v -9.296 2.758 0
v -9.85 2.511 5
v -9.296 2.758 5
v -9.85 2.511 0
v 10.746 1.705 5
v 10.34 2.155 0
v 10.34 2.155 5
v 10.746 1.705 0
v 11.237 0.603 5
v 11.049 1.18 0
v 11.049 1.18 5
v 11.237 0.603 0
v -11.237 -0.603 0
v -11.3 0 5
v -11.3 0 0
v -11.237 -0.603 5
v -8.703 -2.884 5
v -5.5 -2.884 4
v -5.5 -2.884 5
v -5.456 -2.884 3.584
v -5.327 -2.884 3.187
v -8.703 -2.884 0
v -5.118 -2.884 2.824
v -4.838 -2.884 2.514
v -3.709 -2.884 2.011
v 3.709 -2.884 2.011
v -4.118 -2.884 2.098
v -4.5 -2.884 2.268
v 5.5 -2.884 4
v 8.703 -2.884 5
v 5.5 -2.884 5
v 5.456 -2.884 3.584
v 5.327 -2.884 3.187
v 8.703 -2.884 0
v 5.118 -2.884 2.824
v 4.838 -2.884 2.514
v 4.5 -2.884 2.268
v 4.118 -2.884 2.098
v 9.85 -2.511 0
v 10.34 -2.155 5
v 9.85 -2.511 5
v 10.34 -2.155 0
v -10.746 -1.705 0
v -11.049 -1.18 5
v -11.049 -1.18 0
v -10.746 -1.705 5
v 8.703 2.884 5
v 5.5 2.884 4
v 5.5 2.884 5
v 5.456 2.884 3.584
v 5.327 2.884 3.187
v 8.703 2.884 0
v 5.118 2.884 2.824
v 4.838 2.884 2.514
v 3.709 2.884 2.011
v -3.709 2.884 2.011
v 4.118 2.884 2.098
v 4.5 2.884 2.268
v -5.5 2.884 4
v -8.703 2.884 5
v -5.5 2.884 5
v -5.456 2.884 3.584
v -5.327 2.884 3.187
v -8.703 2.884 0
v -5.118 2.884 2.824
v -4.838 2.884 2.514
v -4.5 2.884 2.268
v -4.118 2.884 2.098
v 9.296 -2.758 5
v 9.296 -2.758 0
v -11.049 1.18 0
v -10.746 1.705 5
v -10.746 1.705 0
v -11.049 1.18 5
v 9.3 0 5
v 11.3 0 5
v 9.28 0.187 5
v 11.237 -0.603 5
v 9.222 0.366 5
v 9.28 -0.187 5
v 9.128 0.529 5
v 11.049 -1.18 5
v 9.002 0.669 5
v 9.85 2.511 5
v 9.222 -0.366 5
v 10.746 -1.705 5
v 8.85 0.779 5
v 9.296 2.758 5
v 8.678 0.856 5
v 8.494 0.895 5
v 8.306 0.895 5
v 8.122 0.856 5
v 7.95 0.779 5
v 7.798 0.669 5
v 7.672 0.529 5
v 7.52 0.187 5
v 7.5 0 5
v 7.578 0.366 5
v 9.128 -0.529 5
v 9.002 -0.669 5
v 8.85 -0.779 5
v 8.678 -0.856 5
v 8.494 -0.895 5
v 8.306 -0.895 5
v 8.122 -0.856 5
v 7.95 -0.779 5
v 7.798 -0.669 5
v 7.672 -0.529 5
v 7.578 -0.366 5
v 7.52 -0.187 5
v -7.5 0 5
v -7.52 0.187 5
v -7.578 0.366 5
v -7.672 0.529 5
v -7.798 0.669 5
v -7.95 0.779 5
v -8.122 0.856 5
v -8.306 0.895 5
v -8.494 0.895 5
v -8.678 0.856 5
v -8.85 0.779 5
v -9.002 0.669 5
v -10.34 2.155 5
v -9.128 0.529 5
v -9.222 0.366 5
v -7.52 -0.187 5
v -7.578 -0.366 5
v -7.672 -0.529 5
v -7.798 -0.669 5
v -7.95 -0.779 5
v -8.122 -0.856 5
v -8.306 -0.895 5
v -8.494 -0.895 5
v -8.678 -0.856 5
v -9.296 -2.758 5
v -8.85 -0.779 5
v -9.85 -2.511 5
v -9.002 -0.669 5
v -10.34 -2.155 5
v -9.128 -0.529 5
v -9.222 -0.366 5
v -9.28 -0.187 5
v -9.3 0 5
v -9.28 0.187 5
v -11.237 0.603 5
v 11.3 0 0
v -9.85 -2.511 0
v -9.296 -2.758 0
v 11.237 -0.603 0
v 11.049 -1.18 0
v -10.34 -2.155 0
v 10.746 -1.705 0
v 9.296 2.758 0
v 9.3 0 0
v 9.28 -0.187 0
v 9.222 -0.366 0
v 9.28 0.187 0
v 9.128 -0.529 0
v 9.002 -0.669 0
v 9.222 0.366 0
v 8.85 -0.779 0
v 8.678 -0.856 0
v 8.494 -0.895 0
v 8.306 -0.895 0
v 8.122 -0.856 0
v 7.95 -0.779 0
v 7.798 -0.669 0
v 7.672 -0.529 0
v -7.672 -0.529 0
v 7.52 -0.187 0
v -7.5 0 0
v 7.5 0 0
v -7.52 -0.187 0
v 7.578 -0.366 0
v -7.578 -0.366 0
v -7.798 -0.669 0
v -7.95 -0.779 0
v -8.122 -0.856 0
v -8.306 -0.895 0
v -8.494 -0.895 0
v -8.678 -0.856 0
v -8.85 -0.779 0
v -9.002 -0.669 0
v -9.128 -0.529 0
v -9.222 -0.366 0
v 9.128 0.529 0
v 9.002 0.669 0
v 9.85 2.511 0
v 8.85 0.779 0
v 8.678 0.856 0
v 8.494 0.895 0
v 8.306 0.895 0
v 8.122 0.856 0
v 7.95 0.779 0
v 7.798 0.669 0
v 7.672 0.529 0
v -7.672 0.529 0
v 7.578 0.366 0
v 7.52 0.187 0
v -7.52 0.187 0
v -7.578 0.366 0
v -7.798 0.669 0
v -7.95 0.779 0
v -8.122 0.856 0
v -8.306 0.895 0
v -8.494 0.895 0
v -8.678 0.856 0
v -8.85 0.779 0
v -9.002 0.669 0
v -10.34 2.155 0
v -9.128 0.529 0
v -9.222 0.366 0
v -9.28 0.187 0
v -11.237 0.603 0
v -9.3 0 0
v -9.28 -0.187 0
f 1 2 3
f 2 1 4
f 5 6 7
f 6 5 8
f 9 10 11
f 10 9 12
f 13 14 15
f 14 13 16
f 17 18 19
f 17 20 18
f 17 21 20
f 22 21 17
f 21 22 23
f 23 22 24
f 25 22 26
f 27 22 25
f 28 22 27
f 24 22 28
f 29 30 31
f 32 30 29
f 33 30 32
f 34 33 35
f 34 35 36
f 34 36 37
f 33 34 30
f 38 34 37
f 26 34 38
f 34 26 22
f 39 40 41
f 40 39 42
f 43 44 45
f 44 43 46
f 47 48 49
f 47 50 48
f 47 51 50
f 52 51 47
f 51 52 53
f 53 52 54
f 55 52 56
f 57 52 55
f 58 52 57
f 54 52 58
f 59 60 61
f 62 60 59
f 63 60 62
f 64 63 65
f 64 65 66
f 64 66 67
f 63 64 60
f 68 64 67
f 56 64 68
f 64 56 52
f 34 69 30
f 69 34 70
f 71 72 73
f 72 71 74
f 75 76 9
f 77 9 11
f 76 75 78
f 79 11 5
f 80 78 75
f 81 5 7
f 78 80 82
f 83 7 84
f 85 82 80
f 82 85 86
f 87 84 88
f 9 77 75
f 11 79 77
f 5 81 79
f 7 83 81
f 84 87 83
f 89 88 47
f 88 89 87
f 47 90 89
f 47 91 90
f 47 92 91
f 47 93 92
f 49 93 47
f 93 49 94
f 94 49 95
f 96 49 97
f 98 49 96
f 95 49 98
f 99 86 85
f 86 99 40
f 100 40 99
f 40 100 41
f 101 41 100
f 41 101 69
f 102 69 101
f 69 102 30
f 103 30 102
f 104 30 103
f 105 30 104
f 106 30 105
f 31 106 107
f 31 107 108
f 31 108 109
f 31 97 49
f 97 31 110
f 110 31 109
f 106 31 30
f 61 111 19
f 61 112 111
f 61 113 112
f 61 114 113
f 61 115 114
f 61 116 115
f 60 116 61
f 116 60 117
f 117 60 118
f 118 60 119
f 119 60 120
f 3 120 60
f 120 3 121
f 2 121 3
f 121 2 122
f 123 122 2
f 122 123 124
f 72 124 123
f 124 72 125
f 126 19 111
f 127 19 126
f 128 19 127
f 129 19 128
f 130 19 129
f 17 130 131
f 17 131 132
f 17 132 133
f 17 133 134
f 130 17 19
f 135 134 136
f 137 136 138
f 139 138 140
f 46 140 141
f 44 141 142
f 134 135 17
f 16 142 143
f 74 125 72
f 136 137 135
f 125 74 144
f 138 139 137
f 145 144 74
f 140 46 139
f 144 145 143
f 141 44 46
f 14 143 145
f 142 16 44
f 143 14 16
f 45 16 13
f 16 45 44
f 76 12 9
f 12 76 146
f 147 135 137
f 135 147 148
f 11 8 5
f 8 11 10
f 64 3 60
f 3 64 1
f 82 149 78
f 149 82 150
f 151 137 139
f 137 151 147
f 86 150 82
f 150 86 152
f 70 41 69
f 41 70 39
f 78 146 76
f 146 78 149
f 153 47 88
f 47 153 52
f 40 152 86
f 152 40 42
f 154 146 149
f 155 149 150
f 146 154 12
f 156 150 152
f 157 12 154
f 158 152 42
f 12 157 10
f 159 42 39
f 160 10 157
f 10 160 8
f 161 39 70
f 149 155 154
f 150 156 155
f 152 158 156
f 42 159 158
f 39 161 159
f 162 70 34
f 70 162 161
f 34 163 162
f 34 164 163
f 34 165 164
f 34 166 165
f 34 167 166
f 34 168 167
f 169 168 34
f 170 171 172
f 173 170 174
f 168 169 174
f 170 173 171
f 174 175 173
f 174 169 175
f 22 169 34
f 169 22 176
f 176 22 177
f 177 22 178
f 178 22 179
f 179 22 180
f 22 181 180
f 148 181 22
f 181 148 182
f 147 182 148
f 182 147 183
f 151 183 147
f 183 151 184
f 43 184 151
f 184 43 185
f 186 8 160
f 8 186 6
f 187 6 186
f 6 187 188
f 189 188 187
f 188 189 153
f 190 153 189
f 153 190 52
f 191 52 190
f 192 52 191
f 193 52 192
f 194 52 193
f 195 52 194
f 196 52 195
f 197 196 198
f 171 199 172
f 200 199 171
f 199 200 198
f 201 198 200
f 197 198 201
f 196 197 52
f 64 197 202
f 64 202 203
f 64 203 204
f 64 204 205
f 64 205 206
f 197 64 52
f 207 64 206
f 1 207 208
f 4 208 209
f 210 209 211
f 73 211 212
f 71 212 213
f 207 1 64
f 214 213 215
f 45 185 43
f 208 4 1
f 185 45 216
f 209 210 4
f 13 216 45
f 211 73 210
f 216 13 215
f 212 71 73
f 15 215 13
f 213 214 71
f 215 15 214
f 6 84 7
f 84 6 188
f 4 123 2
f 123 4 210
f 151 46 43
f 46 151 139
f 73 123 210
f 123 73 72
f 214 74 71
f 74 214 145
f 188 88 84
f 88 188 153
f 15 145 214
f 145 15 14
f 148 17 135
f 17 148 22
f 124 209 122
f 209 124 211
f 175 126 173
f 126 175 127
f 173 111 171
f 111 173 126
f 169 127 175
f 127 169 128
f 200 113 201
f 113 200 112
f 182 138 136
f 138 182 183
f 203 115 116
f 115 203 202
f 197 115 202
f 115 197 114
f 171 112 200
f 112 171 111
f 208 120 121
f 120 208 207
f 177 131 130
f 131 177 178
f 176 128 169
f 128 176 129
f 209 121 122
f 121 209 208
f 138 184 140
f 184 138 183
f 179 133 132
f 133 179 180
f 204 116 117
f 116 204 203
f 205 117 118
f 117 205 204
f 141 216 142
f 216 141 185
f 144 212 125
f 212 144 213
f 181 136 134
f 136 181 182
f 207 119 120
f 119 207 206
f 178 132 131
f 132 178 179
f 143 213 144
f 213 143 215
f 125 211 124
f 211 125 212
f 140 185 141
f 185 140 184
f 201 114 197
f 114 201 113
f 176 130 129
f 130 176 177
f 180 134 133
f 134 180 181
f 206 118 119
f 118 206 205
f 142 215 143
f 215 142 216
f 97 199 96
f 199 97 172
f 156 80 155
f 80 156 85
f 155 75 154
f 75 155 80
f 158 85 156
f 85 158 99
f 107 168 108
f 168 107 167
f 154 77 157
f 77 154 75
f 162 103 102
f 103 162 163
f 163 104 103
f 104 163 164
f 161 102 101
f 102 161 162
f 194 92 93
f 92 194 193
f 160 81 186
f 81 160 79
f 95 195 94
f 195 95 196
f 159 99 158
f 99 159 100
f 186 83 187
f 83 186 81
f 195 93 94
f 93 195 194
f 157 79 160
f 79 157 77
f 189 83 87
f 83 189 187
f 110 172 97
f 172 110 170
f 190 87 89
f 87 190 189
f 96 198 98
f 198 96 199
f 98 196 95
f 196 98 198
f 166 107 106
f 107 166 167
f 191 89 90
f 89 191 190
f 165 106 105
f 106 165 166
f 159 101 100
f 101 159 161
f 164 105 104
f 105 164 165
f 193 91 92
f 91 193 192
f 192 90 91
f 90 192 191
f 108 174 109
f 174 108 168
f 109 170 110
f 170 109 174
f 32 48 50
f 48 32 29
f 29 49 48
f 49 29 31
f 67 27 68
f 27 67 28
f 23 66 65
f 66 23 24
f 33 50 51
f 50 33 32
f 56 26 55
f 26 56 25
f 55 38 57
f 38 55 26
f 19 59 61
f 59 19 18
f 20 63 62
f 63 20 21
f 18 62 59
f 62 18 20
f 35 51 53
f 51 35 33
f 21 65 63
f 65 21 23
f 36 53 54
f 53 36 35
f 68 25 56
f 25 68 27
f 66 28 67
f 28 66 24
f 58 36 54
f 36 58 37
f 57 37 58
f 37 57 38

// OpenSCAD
/* [Hidden] */
$fn=30;

/* [Parameters] */
//nail diameter plus extra for hole dialation (add 0.6 for most printers)
nail_diameter = 1.8;
//width of the staple opening
staple_spacing = 11;
//depth of the staple opening
staple_cutout_depth = 3;

/* [Advanced Parameters] */
//radius of staple cutout
staple_radius = 2;
//thickness around nail hole
thickness = 2;
//thickness above cutout
top_thickness = 2;

ct = nail_diameter+2*thickness;
translate([-staple_spacing/2-ct/2,0,staple_cutout_depth+top_thickness])
rotate([180,0,0])
difference() {
	$fn=30;
	hull() {
		cylinder(d=ct,h=staple_cutout_depth+top_thickness);
		translate([staple_spacing+ct,0 ,0 ])
		cylinder(d=ct,h=staple_cutout_depth+top_thickness);
	}
	cylinder(d=nail_diameter,h=3*(staple_cutout_depth+thickness),center=true);
	translate([staple_spacing+ct,0 ,0 ])
	cylinder(d=nail_diameter,h=3*(staple_cutout_depth+thickness),center=true);
	hull() {
		translate([ct/2+staple_radius,0,staple_cutout_depth-staple_radius])
		rotate([90,0,0])
		cylinder(r=staple_radius,h=ct+5 , center=true);
		translate([ct/2-staple_radius+staple_spacing,0,staple_cutout_depth-staple_radius])
		rotate([90,0,0])
		cylinder(r=staple_radius,h=ct+5 , center=true);
		translate([ct/2+staple_radius,0, 0])
		rotate([90,0,0])
		cylinder(r=staple_radius,h=ct+5 , center=true);
		translate([ct/2-staple_radius+staple_spacing,0,0])
		rotate([90,0,0])
		cylinder(r=staple_radius,h=ct+5 , center=true);;
	}
}
